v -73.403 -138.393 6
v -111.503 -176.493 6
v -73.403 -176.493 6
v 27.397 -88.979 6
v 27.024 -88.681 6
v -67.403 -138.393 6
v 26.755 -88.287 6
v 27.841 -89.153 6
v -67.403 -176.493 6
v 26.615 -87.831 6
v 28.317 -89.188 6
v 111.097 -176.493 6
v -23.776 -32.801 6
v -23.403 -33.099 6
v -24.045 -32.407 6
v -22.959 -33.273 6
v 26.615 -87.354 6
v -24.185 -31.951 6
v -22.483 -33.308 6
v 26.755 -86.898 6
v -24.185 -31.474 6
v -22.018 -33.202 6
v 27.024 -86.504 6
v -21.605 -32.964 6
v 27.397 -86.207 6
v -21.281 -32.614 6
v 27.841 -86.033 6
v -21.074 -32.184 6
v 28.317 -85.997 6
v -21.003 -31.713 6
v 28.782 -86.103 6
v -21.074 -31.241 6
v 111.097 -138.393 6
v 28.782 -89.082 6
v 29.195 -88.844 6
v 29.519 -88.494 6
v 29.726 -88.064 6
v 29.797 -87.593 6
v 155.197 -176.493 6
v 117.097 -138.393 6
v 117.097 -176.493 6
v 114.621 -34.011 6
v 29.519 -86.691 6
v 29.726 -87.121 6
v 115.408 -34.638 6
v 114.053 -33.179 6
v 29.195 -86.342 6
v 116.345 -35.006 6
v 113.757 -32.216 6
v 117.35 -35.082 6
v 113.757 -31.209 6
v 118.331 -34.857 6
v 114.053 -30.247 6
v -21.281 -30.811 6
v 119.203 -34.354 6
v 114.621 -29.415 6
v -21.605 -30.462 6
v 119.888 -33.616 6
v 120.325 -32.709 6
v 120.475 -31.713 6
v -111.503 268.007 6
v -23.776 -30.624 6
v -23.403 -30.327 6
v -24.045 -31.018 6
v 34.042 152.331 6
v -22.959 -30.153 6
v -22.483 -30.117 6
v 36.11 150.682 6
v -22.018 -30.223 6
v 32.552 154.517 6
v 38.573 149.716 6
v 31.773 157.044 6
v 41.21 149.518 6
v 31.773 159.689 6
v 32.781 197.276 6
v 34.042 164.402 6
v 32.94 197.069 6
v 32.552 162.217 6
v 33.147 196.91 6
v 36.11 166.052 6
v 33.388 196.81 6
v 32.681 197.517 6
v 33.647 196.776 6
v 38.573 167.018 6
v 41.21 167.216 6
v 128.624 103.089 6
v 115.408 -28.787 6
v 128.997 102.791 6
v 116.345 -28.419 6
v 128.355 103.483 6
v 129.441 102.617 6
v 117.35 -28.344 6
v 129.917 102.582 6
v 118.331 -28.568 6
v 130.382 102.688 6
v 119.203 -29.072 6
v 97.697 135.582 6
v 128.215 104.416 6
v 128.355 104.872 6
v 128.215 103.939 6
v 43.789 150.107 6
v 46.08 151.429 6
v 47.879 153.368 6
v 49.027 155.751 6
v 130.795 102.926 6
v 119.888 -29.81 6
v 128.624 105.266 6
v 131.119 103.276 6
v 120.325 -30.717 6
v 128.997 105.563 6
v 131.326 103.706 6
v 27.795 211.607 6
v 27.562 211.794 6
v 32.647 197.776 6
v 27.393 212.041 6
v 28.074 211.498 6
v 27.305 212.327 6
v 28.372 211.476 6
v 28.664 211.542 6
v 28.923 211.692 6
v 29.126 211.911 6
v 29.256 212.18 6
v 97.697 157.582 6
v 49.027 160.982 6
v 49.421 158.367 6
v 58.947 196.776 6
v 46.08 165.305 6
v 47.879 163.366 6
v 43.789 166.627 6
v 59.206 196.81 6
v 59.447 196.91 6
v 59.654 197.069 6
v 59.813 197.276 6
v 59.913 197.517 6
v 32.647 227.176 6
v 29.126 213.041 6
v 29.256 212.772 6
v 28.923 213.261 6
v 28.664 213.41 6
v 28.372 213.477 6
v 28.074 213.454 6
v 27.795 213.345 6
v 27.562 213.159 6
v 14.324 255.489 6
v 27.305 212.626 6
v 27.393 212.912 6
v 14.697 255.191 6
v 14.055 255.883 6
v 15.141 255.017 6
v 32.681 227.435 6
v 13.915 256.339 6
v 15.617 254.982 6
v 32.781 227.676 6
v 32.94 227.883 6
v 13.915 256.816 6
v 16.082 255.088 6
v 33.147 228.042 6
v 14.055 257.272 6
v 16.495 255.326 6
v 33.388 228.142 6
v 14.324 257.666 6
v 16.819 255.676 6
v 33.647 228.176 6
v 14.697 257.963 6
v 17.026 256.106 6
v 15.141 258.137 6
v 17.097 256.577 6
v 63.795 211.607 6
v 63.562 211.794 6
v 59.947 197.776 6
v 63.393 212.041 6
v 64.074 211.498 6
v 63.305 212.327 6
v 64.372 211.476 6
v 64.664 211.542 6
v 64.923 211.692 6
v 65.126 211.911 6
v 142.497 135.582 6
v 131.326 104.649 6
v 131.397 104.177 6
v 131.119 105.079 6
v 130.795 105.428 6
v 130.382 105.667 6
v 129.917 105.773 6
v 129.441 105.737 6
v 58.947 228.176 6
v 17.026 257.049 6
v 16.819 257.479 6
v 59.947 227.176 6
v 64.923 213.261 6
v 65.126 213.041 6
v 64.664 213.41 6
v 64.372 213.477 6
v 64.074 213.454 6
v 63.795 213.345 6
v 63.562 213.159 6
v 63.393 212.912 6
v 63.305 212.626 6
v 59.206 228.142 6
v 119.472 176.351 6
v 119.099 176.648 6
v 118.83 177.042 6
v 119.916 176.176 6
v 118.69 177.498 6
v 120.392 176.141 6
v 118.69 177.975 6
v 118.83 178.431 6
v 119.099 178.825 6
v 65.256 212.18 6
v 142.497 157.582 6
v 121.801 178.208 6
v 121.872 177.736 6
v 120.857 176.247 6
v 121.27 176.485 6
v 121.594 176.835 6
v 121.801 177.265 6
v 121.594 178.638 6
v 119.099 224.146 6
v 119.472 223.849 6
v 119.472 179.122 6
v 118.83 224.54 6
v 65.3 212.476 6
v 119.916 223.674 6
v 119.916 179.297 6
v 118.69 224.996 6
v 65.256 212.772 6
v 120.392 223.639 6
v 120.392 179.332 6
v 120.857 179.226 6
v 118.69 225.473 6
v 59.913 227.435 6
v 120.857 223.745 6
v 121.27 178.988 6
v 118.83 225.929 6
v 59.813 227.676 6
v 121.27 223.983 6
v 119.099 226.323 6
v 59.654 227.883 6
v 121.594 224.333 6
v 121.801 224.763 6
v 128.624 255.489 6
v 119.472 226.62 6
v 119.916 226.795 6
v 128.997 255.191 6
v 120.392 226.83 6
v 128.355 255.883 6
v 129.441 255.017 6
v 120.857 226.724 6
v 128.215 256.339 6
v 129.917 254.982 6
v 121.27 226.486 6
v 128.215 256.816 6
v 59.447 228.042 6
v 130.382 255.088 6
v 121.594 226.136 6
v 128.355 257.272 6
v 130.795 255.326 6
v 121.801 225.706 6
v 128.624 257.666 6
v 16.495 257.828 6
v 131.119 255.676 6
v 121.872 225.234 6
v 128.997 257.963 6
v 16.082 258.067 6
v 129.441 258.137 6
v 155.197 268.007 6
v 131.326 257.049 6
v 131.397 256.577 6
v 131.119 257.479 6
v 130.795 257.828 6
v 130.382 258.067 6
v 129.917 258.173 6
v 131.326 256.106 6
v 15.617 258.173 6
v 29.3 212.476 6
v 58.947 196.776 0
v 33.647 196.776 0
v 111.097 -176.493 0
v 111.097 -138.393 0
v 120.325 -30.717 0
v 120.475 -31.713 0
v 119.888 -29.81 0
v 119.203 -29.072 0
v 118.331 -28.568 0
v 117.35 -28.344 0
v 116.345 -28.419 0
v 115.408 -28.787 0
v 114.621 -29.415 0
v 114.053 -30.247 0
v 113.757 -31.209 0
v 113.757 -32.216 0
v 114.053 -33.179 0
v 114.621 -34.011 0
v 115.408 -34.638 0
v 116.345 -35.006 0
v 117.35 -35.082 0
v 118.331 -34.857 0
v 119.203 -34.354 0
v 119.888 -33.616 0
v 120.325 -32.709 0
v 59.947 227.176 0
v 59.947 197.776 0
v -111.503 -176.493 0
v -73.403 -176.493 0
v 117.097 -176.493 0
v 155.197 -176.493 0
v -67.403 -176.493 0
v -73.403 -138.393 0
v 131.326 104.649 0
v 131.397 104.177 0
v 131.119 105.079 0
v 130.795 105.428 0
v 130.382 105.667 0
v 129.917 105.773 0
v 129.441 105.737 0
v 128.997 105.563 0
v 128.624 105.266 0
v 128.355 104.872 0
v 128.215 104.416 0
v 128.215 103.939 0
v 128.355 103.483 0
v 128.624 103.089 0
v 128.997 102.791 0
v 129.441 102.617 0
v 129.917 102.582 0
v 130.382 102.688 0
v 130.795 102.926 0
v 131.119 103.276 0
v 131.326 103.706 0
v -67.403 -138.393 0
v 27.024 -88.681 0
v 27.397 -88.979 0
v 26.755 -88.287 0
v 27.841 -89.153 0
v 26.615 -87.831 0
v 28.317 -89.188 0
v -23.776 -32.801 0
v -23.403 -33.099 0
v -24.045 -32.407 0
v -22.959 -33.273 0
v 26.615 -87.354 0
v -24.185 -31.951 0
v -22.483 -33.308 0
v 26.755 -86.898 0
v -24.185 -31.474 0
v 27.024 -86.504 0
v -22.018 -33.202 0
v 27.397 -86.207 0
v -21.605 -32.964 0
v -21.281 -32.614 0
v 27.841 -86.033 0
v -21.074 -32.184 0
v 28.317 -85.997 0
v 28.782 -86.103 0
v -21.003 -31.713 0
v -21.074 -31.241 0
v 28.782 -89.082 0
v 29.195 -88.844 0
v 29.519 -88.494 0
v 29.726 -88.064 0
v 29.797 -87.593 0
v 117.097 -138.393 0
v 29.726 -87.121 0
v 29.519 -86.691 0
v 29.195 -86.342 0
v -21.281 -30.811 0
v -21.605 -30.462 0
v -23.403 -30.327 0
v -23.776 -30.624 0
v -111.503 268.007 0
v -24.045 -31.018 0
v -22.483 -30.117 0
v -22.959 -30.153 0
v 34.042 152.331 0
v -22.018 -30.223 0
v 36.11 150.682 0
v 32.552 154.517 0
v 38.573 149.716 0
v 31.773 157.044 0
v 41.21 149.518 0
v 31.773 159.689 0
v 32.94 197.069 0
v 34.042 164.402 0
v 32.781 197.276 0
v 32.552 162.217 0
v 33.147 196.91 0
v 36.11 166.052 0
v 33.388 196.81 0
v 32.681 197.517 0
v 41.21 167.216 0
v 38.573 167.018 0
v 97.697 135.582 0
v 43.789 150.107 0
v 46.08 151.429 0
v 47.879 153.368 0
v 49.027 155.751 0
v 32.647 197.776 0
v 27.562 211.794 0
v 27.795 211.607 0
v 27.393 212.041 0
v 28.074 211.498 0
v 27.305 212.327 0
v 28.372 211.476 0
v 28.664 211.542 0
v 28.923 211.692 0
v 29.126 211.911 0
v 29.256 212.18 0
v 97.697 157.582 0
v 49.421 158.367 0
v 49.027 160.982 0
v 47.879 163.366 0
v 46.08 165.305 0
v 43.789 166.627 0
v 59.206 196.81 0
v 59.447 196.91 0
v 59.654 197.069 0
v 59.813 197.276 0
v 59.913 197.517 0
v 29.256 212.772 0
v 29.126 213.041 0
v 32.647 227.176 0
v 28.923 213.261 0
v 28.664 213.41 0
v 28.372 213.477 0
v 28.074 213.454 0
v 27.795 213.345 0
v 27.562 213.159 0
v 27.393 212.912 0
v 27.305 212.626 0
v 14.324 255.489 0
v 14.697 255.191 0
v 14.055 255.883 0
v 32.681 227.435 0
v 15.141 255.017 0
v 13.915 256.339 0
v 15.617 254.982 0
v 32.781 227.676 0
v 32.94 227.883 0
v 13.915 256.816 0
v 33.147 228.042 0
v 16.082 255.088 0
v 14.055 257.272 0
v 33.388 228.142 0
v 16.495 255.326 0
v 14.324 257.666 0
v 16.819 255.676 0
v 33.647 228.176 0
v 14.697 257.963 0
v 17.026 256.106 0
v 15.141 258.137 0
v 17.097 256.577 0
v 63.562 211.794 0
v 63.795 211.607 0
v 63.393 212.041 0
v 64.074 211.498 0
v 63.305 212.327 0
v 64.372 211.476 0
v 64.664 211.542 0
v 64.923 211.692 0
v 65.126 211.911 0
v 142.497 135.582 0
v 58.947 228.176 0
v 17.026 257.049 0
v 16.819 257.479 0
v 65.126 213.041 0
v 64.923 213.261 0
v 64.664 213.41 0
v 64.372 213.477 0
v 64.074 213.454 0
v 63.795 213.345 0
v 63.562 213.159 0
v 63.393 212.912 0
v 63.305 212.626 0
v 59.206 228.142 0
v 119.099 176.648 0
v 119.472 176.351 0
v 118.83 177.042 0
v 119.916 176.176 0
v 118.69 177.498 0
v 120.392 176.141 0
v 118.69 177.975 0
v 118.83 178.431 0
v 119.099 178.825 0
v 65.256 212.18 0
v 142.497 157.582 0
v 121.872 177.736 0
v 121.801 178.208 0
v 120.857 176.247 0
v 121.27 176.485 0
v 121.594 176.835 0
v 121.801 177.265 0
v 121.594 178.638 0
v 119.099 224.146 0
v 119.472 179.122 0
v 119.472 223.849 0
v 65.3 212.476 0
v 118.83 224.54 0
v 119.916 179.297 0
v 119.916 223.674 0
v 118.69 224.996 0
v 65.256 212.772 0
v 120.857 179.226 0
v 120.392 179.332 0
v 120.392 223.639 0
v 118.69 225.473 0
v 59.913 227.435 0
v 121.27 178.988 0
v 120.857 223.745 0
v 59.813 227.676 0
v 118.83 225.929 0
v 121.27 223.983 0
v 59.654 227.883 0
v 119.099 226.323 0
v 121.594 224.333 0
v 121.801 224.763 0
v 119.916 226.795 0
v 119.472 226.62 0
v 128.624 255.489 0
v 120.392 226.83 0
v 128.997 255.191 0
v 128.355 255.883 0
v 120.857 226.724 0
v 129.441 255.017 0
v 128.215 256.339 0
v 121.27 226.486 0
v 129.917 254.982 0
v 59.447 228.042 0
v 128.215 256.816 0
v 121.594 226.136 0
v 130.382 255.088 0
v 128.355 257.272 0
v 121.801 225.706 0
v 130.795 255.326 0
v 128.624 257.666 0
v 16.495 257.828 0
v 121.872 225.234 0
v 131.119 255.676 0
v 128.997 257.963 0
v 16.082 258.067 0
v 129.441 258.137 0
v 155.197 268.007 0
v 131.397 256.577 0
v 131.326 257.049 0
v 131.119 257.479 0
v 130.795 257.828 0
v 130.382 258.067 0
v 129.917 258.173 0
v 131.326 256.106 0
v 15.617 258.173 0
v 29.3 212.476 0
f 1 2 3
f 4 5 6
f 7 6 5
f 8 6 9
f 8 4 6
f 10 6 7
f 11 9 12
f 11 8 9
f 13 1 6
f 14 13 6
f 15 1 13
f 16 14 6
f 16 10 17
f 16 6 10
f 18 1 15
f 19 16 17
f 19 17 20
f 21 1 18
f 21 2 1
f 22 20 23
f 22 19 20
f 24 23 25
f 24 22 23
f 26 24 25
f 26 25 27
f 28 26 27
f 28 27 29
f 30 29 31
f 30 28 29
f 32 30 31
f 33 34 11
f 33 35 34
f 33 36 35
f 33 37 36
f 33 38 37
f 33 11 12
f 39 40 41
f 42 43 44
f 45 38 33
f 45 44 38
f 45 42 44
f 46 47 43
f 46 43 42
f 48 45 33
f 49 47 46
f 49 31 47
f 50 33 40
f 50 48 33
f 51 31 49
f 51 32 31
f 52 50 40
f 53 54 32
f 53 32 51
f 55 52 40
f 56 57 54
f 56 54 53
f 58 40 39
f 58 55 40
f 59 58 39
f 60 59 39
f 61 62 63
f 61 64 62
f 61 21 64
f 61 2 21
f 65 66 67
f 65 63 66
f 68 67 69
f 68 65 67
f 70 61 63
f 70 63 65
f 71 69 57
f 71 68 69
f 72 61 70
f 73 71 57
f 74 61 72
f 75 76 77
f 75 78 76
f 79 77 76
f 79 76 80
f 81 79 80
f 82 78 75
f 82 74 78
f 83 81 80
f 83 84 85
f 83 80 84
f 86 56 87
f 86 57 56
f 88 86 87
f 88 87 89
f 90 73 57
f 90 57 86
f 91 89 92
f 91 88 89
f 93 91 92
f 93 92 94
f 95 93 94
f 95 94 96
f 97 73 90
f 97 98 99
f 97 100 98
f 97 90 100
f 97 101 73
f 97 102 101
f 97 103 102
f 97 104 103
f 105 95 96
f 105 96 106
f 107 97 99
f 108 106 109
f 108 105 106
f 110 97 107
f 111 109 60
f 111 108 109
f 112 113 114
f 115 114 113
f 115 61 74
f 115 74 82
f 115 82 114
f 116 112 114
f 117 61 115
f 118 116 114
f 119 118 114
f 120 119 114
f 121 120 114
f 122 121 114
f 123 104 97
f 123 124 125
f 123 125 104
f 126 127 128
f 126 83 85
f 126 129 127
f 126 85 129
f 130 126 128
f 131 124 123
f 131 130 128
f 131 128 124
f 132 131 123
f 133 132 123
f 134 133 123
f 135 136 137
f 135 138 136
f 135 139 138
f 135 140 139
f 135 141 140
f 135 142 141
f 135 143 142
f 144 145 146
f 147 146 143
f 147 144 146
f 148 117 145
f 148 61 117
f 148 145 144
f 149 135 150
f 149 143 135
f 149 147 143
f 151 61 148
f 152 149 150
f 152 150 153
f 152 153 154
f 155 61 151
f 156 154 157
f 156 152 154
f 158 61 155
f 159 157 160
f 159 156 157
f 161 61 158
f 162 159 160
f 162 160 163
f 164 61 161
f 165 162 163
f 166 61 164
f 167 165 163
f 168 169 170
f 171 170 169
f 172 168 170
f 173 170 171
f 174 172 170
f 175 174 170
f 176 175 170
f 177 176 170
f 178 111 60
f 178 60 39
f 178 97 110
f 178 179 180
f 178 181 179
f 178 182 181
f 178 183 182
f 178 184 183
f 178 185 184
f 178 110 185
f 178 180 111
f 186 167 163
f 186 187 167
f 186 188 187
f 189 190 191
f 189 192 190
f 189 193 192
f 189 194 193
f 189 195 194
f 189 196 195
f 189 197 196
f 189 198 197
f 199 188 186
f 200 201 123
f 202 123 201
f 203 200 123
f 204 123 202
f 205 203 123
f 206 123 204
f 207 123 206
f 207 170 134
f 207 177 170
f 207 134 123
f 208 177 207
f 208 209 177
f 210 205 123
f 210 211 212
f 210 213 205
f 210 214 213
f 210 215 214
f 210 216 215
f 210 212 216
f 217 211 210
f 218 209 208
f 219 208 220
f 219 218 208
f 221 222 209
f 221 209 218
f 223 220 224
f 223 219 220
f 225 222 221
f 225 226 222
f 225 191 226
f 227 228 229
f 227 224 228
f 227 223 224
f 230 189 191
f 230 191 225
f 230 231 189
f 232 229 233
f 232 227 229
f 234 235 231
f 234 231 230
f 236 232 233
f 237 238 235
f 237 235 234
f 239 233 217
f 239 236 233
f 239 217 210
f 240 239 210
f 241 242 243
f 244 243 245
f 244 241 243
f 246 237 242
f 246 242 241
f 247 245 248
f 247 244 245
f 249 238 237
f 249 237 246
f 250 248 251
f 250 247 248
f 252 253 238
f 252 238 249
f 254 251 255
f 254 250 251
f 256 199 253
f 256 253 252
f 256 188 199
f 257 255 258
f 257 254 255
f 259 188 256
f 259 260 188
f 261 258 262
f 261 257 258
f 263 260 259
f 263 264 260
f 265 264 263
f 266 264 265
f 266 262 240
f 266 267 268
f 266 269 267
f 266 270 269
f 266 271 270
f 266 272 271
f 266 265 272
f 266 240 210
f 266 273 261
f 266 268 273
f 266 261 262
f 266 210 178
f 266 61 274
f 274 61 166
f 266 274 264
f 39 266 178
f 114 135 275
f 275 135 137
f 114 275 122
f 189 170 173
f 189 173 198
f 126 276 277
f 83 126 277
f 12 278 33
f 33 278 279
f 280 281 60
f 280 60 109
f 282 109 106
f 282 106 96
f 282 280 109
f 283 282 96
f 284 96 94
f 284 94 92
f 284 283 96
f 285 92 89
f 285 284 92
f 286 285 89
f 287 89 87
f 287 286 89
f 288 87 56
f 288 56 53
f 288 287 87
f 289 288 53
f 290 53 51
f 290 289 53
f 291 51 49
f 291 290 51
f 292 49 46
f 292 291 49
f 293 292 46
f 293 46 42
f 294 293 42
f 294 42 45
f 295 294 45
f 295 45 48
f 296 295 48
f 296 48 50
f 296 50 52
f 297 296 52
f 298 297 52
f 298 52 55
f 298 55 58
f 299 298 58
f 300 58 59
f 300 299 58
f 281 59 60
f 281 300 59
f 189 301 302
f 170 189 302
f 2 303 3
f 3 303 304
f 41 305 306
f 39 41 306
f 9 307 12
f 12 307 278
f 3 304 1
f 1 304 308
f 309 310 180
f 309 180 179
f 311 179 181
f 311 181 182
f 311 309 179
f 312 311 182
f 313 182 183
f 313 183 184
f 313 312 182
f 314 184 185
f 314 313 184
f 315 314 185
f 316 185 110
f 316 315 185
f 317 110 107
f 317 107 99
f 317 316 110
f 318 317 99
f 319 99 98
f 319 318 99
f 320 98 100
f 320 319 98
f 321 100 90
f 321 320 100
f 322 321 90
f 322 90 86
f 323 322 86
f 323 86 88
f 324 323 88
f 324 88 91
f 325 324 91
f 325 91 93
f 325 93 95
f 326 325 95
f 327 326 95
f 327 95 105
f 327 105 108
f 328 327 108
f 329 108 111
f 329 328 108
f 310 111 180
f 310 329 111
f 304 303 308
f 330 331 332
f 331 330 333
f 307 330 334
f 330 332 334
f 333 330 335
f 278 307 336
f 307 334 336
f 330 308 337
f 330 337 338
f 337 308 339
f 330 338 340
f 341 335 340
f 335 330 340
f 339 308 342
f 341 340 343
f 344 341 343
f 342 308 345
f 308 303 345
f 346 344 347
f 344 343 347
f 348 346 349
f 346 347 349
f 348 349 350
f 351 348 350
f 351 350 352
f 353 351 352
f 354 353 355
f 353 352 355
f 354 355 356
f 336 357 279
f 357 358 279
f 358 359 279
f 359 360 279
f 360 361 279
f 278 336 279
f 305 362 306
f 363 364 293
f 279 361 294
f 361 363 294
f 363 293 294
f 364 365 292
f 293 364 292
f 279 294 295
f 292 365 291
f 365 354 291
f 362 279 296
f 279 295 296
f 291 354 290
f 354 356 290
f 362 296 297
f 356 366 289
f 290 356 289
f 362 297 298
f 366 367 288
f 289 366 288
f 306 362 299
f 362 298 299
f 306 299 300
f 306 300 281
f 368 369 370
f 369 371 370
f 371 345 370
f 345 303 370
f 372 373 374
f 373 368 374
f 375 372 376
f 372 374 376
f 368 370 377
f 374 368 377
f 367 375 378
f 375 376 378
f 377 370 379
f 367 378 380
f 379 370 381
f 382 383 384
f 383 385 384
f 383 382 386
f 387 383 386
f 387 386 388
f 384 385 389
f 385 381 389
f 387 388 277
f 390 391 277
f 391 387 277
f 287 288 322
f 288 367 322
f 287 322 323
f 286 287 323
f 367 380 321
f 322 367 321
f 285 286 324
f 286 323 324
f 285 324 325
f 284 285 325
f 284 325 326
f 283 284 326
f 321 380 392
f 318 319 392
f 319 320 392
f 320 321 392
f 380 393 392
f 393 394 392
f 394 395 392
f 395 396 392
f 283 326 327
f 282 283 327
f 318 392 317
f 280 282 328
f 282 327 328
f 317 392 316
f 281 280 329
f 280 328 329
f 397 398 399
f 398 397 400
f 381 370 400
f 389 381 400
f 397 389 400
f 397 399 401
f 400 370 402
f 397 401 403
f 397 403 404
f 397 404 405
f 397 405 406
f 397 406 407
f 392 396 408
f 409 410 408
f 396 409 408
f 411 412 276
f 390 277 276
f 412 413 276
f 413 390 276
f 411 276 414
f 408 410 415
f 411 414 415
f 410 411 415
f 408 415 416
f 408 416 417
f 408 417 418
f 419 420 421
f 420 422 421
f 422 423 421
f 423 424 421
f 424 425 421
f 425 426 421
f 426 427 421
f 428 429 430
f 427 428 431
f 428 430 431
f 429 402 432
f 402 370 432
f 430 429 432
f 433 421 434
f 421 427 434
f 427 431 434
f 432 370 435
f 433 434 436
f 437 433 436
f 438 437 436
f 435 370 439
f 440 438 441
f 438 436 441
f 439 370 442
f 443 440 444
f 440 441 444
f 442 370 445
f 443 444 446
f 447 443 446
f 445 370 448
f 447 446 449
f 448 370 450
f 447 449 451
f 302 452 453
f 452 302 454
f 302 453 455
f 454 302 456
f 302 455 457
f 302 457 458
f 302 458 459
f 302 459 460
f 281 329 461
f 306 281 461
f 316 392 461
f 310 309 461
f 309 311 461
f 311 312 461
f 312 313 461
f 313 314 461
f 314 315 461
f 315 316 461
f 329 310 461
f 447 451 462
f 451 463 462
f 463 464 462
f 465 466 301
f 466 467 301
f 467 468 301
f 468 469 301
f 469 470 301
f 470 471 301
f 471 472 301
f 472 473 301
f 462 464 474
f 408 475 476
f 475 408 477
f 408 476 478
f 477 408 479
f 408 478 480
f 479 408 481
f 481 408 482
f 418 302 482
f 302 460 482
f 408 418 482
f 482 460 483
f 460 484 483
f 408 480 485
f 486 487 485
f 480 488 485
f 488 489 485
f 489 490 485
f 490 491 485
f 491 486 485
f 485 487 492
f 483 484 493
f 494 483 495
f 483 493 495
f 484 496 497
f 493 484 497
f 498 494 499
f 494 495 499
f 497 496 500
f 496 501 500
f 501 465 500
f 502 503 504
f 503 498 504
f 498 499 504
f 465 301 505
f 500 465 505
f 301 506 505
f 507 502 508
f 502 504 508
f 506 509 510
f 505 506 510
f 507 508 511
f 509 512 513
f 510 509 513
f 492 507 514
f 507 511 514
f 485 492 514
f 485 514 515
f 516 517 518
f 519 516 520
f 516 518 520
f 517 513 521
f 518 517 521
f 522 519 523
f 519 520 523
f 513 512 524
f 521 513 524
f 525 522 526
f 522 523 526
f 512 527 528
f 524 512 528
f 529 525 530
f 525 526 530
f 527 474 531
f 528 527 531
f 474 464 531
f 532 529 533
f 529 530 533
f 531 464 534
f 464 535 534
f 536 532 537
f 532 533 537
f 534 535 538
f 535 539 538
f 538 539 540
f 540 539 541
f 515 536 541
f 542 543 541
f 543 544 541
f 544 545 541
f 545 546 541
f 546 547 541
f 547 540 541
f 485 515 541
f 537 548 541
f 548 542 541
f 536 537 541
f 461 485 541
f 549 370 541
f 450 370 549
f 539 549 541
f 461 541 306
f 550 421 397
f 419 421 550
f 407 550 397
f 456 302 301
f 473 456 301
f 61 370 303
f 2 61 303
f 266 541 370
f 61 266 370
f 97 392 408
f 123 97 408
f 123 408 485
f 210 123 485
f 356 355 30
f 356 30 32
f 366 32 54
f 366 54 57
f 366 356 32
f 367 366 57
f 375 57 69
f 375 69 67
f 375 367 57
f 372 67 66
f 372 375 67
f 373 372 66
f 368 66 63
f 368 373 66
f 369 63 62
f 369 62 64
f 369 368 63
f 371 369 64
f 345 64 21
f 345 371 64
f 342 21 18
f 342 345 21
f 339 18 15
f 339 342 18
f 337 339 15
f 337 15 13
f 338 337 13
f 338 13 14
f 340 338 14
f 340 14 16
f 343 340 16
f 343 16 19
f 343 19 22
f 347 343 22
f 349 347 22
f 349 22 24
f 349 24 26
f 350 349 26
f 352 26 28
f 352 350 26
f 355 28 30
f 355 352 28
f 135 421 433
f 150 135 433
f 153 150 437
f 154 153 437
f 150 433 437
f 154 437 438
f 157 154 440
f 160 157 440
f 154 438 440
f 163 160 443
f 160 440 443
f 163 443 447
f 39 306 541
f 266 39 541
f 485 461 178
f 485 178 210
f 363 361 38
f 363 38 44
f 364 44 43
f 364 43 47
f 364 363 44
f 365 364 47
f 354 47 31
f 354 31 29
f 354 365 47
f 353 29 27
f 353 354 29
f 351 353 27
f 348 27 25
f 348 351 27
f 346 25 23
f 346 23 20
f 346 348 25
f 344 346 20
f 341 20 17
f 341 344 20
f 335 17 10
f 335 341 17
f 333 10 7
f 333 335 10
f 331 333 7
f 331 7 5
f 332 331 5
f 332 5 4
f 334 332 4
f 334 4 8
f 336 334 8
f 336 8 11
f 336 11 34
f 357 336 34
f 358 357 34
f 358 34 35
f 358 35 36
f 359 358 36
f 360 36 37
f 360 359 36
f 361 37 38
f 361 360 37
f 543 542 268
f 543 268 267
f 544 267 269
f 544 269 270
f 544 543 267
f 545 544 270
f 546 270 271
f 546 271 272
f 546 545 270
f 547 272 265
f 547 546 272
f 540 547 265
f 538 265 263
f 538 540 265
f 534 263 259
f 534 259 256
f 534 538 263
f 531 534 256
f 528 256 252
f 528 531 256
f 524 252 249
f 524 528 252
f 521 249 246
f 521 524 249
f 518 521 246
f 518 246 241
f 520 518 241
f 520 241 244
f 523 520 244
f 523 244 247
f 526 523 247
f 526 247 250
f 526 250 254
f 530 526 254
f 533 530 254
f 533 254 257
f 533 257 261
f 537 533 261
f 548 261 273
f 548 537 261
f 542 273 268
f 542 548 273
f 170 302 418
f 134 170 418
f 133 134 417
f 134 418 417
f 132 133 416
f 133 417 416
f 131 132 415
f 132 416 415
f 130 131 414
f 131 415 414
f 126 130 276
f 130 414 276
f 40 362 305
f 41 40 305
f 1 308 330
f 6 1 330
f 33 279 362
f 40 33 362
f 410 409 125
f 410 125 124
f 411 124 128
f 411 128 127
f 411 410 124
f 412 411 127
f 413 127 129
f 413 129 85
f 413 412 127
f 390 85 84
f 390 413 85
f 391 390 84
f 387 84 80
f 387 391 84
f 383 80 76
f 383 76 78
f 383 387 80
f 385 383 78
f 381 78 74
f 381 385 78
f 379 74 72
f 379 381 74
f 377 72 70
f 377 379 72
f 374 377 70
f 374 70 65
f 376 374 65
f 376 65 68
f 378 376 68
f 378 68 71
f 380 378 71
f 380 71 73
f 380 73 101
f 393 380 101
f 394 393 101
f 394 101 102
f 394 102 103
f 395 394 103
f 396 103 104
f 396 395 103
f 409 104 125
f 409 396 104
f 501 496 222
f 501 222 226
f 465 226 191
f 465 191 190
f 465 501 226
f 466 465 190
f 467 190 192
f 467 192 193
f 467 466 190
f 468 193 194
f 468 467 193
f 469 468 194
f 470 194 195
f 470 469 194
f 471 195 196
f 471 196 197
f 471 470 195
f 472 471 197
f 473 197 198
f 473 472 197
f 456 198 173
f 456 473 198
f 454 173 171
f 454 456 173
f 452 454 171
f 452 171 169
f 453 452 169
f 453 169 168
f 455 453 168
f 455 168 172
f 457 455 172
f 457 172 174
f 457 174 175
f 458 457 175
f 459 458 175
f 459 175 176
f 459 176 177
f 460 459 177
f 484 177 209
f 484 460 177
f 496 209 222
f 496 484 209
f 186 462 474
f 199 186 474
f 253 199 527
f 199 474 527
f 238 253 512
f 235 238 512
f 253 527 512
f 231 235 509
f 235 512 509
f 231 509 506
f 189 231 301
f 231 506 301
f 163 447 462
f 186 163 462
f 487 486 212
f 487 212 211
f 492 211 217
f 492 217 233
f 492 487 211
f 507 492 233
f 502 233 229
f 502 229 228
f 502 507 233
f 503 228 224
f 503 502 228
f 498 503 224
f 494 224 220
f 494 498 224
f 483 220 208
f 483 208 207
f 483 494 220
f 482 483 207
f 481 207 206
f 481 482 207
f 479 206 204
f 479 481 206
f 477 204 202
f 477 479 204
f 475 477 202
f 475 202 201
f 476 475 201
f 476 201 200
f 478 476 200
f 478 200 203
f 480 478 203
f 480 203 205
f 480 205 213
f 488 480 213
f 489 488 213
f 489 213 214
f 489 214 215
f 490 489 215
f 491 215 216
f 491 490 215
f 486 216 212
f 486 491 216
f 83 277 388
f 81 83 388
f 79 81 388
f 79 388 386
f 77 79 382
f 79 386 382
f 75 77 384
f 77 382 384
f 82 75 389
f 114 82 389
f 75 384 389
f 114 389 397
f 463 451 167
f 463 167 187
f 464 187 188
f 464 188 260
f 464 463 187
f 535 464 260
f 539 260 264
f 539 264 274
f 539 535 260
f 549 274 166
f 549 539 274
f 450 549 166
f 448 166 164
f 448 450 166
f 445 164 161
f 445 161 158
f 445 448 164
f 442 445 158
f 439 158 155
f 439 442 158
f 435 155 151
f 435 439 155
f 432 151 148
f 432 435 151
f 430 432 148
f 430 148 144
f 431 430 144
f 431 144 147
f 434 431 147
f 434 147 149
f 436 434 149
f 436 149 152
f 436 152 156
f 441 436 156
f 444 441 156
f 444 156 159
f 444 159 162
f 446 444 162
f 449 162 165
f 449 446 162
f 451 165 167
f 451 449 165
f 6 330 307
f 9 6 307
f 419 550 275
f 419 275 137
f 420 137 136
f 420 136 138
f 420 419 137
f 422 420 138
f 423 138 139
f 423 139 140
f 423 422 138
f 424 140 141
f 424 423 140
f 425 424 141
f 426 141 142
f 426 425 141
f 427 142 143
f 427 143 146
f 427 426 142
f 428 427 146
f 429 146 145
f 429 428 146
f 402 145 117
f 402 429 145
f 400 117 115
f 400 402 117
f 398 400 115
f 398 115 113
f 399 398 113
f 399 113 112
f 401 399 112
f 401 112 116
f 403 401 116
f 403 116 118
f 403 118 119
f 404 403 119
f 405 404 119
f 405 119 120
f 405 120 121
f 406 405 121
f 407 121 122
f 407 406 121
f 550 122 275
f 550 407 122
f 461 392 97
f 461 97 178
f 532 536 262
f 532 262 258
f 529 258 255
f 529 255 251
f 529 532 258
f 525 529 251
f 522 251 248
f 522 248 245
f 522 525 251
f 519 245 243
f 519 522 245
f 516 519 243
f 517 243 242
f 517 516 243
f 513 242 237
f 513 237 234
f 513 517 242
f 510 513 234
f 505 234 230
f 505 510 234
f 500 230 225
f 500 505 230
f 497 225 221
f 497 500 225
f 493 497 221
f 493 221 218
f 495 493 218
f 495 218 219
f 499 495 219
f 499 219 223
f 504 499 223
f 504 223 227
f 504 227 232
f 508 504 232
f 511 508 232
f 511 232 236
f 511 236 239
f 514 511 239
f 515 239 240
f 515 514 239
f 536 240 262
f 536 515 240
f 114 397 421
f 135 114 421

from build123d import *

# Parameters (mm, degrees)
F0_R     = 1.6002
F0_R_2   = 3.3782
F0_W     = 44.8
F0_H     = 22
F0_R_3   = 8.873689
F0_R_4   = 1.0033
F1_DEPTH = 6


with BuildPart() as f1:
    # F0 (on Top) → F1 (new body)
    with BuildSketch(Plane.XY):
        Polygon((155.197096, 268.007227), (-111.502904, 268.007227), (-111.502904, -176.492773), (-73.402904, -176.492773), (-73.402904, -138.392773), (-67.402904, -138.392773), (-67.402904, -176.492773), (111.097096, -176.492773), (111.097096, -138.392773), (117.097096, -138.392773), (117.097096, -176.492773), (155.197096, -176.492773), align=None)
        with Locations((-22.602904, -31.712773)):
            Circle(F0_R, mode=Mode.SUBTRACT)
        with Locations((28.197096, -87.592773)):
            Circle(F0_R, mode=Mode.SUBTRACT)
        with Locations((117.097096, -31.712773)):
            Circle(F0_R_2, mode=Mode.SUBTRACT)
        with Locations((15.497096, 256.577227)):
            Circle(F0_R, mode=Mode.SUBTRACT)
        with Locations((120.097096, 146.581596)):
            Rectangle(F0_W, F0_H, mode=Mode.SUBTRACT)
        with Locations((129.797096, 104.177227)):
            Circle(F0_R, mode=Mode.SUBTRACT)
        with Locations((40.547096, 158.366844)):
            Circle(F0_R_3, mode=Mode.SUBTRACT)
        with Locations((28.297096, 212.476226)):
            Circle(F0_R_4, mode=Mode.SUBTRACT)
        with BuildLine():
            ThreePointArc((32.647096, 227.176226), (32.939989, 227.883333), (33.647096, 228.176226))
            Line((33.647096, 228.176226), (58.947096, 228.176226))
            ThreePointArc((58.947096, 228.176226), (59.654203, 227.883333), (59.947096, 227.176226))
            Line((59.947096, 227.176226), (59.947096, 197.776226))
            ThreePointArc((59.947096, 197.776226), (59.654203, 197.069119), (58.947096, 196.776226))
            Line((58.947096, 196.776226), (33.647096, 196.776226))
            ThreePointArc((33.647096, 196.776226), (32.939989, 197.069119), (32.647096, 197.776226))
            Line((32.647096, 197.776226), (32.647096, 227.176226))
        make_face(mode=Mode.SUBTRACT)
        with Locations((64.297096, 212.476226)):
            Circle(F0_R_4, mode=Mode.SUBTRACT)
        with Locations((120.272096, 177.736496)):
            Circle(F0_R, mode=Mode.SUBTRACT)
        with Locations((120.272096, 225.234496)):
            Circle(F0_R, mode=Mode.SUBTRACT)
        with Locations((129.797096, 256.577227)):
            Circle(F0_R, mode=Mode.SUBTRACT)
    extrude(amount=F1_DEPTH)


solid = f1.part
